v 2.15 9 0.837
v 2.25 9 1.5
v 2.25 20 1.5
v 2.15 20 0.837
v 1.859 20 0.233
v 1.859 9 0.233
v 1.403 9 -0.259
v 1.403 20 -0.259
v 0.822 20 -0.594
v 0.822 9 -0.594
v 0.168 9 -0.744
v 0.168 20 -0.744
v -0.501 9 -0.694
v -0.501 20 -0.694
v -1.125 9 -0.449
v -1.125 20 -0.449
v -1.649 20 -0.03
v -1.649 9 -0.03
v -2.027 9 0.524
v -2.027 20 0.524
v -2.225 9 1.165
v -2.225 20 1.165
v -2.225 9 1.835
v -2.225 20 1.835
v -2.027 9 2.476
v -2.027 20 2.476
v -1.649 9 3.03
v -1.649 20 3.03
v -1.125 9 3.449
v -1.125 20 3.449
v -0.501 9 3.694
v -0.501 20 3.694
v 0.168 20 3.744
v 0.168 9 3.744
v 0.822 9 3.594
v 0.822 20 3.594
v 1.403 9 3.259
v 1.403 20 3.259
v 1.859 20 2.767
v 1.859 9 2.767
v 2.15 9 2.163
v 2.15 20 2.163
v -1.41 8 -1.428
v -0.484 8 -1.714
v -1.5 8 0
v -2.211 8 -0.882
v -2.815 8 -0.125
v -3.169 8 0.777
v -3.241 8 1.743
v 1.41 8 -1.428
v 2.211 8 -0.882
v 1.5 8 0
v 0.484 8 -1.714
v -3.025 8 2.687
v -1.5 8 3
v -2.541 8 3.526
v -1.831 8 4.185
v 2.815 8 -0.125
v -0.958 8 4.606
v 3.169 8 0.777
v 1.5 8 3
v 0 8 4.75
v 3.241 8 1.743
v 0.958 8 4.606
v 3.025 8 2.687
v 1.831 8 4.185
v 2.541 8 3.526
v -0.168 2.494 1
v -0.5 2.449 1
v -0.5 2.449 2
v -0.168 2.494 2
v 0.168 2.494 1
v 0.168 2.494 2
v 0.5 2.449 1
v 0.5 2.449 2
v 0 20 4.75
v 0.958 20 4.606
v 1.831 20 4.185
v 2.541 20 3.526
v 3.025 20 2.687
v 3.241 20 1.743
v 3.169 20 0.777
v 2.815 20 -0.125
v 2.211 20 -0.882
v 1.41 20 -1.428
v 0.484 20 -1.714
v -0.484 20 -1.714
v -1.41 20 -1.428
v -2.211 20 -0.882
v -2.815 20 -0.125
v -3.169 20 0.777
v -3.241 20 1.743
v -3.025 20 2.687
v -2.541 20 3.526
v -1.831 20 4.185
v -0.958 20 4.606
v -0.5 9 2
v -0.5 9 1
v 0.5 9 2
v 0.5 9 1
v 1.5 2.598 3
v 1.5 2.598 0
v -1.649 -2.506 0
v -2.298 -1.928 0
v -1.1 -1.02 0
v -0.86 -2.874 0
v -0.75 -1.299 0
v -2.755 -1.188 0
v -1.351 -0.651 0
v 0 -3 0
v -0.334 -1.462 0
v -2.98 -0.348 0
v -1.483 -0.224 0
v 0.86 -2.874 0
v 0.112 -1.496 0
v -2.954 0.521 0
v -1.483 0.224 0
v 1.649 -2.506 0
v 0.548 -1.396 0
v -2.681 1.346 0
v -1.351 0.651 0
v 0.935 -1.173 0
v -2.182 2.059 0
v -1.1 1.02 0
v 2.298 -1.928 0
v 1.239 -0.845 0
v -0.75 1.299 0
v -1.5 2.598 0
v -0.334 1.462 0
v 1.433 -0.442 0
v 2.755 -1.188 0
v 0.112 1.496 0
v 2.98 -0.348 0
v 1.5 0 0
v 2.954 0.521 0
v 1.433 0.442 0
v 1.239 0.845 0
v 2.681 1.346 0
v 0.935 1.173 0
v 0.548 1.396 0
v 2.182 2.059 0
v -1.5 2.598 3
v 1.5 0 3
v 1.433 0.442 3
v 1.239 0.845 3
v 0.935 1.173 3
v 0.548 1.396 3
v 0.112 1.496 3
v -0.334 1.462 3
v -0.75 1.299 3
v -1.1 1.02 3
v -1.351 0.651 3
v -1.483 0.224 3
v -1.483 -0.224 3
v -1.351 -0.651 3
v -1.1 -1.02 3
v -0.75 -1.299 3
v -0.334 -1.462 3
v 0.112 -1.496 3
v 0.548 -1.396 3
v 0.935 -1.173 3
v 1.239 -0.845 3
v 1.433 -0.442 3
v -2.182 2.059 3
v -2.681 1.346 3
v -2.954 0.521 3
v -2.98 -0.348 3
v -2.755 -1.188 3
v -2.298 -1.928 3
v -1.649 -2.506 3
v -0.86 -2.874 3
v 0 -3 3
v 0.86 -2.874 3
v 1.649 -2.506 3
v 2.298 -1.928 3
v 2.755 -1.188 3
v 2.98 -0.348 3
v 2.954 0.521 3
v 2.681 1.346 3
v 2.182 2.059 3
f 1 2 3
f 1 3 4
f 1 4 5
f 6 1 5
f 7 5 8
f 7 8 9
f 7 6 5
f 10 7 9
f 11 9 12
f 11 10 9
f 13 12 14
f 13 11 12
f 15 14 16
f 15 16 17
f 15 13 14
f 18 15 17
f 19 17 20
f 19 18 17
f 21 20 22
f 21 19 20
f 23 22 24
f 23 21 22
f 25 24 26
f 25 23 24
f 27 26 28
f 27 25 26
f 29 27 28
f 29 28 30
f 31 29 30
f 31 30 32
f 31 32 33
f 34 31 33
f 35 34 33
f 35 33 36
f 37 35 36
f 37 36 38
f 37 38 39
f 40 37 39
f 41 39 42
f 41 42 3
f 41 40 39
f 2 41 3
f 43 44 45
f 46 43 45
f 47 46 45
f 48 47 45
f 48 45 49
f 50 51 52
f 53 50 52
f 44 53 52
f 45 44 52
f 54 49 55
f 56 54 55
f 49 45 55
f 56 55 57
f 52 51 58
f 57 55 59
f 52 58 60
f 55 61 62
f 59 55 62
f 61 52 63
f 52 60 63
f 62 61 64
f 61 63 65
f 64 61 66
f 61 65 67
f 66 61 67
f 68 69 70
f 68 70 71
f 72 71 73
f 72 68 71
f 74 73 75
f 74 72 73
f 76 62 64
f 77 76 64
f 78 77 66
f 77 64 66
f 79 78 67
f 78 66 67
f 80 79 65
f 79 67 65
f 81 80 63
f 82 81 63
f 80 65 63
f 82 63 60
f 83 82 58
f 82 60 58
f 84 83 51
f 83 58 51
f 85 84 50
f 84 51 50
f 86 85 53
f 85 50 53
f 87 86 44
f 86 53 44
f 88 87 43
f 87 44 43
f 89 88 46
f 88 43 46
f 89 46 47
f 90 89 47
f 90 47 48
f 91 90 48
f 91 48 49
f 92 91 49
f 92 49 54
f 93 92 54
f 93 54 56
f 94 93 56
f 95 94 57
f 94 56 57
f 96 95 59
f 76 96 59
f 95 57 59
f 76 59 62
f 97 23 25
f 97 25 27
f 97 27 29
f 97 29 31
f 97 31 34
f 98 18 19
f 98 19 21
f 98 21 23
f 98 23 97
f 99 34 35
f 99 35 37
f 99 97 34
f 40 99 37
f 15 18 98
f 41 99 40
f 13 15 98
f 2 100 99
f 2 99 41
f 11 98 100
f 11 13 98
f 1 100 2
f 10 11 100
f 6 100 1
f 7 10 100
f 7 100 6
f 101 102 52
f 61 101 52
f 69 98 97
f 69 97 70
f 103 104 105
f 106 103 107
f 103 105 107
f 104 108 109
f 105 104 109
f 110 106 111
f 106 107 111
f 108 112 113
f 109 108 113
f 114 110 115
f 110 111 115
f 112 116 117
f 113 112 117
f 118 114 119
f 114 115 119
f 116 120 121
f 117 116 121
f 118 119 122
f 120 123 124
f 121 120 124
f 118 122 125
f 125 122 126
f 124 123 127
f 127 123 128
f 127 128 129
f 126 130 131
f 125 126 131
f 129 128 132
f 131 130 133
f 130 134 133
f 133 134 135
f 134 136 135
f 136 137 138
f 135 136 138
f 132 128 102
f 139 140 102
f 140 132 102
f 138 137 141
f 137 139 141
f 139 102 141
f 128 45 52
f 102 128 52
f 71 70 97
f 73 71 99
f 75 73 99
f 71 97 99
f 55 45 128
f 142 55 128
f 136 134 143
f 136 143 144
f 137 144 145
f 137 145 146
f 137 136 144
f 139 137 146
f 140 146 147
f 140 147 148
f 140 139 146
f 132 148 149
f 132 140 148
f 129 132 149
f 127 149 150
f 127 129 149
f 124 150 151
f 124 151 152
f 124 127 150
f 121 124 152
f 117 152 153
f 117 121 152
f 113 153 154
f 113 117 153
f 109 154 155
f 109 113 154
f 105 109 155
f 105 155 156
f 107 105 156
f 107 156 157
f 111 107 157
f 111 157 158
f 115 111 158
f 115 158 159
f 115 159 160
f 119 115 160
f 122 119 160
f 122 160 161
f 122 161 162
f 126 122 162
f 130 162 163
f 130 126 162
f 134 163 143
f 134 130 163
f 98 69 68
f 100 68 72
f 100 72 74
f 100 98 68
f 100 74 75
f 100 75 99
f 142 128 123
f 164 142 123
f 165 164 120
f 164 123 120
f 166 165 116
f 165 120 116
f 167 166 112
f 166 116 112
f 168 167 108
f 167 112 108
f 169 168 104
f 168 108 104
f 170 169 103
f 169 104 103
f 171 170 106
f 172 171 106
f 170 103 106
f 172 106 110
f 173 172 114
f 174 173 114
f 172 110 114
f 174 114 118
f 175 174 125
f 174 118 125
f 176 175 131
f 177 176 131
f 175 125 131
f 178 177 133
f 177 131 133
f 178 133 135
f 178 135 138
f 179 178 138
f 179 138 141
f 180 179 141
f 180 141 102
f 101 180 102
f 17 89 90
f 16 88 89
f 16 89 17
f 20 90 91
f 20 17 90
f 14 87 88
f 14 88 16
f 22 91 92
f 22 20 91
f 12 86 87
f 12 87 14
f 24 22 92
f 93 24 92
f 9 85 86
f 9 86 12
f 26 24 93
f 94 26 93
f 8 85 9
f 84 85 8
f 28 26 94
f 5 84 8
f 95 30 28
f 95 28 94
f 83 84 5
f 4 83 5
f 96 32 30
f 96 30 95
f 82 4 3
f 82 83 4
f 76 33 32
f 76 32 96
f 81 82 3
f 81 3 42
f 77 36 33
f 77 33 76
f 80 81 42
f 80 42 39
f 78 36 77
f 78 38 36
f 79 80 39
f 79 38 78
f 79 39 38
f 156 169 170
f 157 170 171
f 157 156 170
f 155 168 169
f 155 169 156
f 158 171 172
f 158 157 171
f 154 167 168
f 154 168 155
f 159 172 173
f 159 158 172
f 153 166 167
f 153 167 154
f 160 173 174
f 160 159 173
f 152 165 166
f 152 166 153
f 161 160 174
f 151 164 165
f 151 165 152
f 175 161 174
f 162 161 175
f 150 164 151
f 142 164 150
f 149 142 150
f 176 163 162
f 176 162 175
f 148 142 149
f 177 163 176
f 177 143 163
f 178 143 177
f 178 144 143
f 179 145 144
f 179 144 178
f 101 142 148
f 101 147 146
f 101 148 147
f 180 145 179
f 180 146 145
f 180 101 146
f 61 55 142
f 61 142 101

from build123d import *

# Parameters (mm, degrees)
CROQUIS1_R                   = 1.5
SALIENTE_EXTRUIR1_DEPTH      = 3
SALIENTE_EXTRUIR2_DEPTH      = 10
SALIENTE_EXTRUIR2_DEPTH_BACK = 2
CROQUIS2_R                   = 3.25
VACIADO1_T                   = -1


with BuildPart() as part:
    # Croquis1 → Saliente-Extruir1 (new body)
    with BuildSketch(Plane.XY):
        with BuildLine():
            Line((1.5, 10), (-1.5, 10))
            Line((-1.5, 10), (-1.5, 2.598076211))
            ThreePointArc((-1.5, 2.598076211), (0, -3), (1.5, 2.598076211))
            Line((1.5, 2.598076211), (1.5, 10))
        make_face()
        Circle(CROQUIS1_R, mode=Mode.SUBTRACT)
    extrude(amount=SALIENTE_EXTRUIR1_DEPTH)

    # Croquis2 → Saliente-Extruir2 (add, two sides: drawn at the far end of the back side and taken through both)
    with BuildSketch(Plane(origin=(0, 10, 0), x_dir=(1, 0, 0), z_dir=(0, 1, 0)).offset(-SALIENTE_EXTRUIR2_DEPTH_BACK)):
        with Locations((0, -1.5)):
            Circle(CROQUIS2_R)
    extrude(amount=SALIENTE_EXTRUIR2_DEPTH + SALIENTE_EXTRUIR2_DEPTH_BACK)

    # Vaciado1
    vaciado1_openings = [part.faces().sort_by_distance(p)[0] for p in [
        (0, 20, 1.5),
    ]]
    offset(amount=VACIADO1_T, openings=vaciado1_openings, kind=Kind.INTERSECTION)


solid = part.part
